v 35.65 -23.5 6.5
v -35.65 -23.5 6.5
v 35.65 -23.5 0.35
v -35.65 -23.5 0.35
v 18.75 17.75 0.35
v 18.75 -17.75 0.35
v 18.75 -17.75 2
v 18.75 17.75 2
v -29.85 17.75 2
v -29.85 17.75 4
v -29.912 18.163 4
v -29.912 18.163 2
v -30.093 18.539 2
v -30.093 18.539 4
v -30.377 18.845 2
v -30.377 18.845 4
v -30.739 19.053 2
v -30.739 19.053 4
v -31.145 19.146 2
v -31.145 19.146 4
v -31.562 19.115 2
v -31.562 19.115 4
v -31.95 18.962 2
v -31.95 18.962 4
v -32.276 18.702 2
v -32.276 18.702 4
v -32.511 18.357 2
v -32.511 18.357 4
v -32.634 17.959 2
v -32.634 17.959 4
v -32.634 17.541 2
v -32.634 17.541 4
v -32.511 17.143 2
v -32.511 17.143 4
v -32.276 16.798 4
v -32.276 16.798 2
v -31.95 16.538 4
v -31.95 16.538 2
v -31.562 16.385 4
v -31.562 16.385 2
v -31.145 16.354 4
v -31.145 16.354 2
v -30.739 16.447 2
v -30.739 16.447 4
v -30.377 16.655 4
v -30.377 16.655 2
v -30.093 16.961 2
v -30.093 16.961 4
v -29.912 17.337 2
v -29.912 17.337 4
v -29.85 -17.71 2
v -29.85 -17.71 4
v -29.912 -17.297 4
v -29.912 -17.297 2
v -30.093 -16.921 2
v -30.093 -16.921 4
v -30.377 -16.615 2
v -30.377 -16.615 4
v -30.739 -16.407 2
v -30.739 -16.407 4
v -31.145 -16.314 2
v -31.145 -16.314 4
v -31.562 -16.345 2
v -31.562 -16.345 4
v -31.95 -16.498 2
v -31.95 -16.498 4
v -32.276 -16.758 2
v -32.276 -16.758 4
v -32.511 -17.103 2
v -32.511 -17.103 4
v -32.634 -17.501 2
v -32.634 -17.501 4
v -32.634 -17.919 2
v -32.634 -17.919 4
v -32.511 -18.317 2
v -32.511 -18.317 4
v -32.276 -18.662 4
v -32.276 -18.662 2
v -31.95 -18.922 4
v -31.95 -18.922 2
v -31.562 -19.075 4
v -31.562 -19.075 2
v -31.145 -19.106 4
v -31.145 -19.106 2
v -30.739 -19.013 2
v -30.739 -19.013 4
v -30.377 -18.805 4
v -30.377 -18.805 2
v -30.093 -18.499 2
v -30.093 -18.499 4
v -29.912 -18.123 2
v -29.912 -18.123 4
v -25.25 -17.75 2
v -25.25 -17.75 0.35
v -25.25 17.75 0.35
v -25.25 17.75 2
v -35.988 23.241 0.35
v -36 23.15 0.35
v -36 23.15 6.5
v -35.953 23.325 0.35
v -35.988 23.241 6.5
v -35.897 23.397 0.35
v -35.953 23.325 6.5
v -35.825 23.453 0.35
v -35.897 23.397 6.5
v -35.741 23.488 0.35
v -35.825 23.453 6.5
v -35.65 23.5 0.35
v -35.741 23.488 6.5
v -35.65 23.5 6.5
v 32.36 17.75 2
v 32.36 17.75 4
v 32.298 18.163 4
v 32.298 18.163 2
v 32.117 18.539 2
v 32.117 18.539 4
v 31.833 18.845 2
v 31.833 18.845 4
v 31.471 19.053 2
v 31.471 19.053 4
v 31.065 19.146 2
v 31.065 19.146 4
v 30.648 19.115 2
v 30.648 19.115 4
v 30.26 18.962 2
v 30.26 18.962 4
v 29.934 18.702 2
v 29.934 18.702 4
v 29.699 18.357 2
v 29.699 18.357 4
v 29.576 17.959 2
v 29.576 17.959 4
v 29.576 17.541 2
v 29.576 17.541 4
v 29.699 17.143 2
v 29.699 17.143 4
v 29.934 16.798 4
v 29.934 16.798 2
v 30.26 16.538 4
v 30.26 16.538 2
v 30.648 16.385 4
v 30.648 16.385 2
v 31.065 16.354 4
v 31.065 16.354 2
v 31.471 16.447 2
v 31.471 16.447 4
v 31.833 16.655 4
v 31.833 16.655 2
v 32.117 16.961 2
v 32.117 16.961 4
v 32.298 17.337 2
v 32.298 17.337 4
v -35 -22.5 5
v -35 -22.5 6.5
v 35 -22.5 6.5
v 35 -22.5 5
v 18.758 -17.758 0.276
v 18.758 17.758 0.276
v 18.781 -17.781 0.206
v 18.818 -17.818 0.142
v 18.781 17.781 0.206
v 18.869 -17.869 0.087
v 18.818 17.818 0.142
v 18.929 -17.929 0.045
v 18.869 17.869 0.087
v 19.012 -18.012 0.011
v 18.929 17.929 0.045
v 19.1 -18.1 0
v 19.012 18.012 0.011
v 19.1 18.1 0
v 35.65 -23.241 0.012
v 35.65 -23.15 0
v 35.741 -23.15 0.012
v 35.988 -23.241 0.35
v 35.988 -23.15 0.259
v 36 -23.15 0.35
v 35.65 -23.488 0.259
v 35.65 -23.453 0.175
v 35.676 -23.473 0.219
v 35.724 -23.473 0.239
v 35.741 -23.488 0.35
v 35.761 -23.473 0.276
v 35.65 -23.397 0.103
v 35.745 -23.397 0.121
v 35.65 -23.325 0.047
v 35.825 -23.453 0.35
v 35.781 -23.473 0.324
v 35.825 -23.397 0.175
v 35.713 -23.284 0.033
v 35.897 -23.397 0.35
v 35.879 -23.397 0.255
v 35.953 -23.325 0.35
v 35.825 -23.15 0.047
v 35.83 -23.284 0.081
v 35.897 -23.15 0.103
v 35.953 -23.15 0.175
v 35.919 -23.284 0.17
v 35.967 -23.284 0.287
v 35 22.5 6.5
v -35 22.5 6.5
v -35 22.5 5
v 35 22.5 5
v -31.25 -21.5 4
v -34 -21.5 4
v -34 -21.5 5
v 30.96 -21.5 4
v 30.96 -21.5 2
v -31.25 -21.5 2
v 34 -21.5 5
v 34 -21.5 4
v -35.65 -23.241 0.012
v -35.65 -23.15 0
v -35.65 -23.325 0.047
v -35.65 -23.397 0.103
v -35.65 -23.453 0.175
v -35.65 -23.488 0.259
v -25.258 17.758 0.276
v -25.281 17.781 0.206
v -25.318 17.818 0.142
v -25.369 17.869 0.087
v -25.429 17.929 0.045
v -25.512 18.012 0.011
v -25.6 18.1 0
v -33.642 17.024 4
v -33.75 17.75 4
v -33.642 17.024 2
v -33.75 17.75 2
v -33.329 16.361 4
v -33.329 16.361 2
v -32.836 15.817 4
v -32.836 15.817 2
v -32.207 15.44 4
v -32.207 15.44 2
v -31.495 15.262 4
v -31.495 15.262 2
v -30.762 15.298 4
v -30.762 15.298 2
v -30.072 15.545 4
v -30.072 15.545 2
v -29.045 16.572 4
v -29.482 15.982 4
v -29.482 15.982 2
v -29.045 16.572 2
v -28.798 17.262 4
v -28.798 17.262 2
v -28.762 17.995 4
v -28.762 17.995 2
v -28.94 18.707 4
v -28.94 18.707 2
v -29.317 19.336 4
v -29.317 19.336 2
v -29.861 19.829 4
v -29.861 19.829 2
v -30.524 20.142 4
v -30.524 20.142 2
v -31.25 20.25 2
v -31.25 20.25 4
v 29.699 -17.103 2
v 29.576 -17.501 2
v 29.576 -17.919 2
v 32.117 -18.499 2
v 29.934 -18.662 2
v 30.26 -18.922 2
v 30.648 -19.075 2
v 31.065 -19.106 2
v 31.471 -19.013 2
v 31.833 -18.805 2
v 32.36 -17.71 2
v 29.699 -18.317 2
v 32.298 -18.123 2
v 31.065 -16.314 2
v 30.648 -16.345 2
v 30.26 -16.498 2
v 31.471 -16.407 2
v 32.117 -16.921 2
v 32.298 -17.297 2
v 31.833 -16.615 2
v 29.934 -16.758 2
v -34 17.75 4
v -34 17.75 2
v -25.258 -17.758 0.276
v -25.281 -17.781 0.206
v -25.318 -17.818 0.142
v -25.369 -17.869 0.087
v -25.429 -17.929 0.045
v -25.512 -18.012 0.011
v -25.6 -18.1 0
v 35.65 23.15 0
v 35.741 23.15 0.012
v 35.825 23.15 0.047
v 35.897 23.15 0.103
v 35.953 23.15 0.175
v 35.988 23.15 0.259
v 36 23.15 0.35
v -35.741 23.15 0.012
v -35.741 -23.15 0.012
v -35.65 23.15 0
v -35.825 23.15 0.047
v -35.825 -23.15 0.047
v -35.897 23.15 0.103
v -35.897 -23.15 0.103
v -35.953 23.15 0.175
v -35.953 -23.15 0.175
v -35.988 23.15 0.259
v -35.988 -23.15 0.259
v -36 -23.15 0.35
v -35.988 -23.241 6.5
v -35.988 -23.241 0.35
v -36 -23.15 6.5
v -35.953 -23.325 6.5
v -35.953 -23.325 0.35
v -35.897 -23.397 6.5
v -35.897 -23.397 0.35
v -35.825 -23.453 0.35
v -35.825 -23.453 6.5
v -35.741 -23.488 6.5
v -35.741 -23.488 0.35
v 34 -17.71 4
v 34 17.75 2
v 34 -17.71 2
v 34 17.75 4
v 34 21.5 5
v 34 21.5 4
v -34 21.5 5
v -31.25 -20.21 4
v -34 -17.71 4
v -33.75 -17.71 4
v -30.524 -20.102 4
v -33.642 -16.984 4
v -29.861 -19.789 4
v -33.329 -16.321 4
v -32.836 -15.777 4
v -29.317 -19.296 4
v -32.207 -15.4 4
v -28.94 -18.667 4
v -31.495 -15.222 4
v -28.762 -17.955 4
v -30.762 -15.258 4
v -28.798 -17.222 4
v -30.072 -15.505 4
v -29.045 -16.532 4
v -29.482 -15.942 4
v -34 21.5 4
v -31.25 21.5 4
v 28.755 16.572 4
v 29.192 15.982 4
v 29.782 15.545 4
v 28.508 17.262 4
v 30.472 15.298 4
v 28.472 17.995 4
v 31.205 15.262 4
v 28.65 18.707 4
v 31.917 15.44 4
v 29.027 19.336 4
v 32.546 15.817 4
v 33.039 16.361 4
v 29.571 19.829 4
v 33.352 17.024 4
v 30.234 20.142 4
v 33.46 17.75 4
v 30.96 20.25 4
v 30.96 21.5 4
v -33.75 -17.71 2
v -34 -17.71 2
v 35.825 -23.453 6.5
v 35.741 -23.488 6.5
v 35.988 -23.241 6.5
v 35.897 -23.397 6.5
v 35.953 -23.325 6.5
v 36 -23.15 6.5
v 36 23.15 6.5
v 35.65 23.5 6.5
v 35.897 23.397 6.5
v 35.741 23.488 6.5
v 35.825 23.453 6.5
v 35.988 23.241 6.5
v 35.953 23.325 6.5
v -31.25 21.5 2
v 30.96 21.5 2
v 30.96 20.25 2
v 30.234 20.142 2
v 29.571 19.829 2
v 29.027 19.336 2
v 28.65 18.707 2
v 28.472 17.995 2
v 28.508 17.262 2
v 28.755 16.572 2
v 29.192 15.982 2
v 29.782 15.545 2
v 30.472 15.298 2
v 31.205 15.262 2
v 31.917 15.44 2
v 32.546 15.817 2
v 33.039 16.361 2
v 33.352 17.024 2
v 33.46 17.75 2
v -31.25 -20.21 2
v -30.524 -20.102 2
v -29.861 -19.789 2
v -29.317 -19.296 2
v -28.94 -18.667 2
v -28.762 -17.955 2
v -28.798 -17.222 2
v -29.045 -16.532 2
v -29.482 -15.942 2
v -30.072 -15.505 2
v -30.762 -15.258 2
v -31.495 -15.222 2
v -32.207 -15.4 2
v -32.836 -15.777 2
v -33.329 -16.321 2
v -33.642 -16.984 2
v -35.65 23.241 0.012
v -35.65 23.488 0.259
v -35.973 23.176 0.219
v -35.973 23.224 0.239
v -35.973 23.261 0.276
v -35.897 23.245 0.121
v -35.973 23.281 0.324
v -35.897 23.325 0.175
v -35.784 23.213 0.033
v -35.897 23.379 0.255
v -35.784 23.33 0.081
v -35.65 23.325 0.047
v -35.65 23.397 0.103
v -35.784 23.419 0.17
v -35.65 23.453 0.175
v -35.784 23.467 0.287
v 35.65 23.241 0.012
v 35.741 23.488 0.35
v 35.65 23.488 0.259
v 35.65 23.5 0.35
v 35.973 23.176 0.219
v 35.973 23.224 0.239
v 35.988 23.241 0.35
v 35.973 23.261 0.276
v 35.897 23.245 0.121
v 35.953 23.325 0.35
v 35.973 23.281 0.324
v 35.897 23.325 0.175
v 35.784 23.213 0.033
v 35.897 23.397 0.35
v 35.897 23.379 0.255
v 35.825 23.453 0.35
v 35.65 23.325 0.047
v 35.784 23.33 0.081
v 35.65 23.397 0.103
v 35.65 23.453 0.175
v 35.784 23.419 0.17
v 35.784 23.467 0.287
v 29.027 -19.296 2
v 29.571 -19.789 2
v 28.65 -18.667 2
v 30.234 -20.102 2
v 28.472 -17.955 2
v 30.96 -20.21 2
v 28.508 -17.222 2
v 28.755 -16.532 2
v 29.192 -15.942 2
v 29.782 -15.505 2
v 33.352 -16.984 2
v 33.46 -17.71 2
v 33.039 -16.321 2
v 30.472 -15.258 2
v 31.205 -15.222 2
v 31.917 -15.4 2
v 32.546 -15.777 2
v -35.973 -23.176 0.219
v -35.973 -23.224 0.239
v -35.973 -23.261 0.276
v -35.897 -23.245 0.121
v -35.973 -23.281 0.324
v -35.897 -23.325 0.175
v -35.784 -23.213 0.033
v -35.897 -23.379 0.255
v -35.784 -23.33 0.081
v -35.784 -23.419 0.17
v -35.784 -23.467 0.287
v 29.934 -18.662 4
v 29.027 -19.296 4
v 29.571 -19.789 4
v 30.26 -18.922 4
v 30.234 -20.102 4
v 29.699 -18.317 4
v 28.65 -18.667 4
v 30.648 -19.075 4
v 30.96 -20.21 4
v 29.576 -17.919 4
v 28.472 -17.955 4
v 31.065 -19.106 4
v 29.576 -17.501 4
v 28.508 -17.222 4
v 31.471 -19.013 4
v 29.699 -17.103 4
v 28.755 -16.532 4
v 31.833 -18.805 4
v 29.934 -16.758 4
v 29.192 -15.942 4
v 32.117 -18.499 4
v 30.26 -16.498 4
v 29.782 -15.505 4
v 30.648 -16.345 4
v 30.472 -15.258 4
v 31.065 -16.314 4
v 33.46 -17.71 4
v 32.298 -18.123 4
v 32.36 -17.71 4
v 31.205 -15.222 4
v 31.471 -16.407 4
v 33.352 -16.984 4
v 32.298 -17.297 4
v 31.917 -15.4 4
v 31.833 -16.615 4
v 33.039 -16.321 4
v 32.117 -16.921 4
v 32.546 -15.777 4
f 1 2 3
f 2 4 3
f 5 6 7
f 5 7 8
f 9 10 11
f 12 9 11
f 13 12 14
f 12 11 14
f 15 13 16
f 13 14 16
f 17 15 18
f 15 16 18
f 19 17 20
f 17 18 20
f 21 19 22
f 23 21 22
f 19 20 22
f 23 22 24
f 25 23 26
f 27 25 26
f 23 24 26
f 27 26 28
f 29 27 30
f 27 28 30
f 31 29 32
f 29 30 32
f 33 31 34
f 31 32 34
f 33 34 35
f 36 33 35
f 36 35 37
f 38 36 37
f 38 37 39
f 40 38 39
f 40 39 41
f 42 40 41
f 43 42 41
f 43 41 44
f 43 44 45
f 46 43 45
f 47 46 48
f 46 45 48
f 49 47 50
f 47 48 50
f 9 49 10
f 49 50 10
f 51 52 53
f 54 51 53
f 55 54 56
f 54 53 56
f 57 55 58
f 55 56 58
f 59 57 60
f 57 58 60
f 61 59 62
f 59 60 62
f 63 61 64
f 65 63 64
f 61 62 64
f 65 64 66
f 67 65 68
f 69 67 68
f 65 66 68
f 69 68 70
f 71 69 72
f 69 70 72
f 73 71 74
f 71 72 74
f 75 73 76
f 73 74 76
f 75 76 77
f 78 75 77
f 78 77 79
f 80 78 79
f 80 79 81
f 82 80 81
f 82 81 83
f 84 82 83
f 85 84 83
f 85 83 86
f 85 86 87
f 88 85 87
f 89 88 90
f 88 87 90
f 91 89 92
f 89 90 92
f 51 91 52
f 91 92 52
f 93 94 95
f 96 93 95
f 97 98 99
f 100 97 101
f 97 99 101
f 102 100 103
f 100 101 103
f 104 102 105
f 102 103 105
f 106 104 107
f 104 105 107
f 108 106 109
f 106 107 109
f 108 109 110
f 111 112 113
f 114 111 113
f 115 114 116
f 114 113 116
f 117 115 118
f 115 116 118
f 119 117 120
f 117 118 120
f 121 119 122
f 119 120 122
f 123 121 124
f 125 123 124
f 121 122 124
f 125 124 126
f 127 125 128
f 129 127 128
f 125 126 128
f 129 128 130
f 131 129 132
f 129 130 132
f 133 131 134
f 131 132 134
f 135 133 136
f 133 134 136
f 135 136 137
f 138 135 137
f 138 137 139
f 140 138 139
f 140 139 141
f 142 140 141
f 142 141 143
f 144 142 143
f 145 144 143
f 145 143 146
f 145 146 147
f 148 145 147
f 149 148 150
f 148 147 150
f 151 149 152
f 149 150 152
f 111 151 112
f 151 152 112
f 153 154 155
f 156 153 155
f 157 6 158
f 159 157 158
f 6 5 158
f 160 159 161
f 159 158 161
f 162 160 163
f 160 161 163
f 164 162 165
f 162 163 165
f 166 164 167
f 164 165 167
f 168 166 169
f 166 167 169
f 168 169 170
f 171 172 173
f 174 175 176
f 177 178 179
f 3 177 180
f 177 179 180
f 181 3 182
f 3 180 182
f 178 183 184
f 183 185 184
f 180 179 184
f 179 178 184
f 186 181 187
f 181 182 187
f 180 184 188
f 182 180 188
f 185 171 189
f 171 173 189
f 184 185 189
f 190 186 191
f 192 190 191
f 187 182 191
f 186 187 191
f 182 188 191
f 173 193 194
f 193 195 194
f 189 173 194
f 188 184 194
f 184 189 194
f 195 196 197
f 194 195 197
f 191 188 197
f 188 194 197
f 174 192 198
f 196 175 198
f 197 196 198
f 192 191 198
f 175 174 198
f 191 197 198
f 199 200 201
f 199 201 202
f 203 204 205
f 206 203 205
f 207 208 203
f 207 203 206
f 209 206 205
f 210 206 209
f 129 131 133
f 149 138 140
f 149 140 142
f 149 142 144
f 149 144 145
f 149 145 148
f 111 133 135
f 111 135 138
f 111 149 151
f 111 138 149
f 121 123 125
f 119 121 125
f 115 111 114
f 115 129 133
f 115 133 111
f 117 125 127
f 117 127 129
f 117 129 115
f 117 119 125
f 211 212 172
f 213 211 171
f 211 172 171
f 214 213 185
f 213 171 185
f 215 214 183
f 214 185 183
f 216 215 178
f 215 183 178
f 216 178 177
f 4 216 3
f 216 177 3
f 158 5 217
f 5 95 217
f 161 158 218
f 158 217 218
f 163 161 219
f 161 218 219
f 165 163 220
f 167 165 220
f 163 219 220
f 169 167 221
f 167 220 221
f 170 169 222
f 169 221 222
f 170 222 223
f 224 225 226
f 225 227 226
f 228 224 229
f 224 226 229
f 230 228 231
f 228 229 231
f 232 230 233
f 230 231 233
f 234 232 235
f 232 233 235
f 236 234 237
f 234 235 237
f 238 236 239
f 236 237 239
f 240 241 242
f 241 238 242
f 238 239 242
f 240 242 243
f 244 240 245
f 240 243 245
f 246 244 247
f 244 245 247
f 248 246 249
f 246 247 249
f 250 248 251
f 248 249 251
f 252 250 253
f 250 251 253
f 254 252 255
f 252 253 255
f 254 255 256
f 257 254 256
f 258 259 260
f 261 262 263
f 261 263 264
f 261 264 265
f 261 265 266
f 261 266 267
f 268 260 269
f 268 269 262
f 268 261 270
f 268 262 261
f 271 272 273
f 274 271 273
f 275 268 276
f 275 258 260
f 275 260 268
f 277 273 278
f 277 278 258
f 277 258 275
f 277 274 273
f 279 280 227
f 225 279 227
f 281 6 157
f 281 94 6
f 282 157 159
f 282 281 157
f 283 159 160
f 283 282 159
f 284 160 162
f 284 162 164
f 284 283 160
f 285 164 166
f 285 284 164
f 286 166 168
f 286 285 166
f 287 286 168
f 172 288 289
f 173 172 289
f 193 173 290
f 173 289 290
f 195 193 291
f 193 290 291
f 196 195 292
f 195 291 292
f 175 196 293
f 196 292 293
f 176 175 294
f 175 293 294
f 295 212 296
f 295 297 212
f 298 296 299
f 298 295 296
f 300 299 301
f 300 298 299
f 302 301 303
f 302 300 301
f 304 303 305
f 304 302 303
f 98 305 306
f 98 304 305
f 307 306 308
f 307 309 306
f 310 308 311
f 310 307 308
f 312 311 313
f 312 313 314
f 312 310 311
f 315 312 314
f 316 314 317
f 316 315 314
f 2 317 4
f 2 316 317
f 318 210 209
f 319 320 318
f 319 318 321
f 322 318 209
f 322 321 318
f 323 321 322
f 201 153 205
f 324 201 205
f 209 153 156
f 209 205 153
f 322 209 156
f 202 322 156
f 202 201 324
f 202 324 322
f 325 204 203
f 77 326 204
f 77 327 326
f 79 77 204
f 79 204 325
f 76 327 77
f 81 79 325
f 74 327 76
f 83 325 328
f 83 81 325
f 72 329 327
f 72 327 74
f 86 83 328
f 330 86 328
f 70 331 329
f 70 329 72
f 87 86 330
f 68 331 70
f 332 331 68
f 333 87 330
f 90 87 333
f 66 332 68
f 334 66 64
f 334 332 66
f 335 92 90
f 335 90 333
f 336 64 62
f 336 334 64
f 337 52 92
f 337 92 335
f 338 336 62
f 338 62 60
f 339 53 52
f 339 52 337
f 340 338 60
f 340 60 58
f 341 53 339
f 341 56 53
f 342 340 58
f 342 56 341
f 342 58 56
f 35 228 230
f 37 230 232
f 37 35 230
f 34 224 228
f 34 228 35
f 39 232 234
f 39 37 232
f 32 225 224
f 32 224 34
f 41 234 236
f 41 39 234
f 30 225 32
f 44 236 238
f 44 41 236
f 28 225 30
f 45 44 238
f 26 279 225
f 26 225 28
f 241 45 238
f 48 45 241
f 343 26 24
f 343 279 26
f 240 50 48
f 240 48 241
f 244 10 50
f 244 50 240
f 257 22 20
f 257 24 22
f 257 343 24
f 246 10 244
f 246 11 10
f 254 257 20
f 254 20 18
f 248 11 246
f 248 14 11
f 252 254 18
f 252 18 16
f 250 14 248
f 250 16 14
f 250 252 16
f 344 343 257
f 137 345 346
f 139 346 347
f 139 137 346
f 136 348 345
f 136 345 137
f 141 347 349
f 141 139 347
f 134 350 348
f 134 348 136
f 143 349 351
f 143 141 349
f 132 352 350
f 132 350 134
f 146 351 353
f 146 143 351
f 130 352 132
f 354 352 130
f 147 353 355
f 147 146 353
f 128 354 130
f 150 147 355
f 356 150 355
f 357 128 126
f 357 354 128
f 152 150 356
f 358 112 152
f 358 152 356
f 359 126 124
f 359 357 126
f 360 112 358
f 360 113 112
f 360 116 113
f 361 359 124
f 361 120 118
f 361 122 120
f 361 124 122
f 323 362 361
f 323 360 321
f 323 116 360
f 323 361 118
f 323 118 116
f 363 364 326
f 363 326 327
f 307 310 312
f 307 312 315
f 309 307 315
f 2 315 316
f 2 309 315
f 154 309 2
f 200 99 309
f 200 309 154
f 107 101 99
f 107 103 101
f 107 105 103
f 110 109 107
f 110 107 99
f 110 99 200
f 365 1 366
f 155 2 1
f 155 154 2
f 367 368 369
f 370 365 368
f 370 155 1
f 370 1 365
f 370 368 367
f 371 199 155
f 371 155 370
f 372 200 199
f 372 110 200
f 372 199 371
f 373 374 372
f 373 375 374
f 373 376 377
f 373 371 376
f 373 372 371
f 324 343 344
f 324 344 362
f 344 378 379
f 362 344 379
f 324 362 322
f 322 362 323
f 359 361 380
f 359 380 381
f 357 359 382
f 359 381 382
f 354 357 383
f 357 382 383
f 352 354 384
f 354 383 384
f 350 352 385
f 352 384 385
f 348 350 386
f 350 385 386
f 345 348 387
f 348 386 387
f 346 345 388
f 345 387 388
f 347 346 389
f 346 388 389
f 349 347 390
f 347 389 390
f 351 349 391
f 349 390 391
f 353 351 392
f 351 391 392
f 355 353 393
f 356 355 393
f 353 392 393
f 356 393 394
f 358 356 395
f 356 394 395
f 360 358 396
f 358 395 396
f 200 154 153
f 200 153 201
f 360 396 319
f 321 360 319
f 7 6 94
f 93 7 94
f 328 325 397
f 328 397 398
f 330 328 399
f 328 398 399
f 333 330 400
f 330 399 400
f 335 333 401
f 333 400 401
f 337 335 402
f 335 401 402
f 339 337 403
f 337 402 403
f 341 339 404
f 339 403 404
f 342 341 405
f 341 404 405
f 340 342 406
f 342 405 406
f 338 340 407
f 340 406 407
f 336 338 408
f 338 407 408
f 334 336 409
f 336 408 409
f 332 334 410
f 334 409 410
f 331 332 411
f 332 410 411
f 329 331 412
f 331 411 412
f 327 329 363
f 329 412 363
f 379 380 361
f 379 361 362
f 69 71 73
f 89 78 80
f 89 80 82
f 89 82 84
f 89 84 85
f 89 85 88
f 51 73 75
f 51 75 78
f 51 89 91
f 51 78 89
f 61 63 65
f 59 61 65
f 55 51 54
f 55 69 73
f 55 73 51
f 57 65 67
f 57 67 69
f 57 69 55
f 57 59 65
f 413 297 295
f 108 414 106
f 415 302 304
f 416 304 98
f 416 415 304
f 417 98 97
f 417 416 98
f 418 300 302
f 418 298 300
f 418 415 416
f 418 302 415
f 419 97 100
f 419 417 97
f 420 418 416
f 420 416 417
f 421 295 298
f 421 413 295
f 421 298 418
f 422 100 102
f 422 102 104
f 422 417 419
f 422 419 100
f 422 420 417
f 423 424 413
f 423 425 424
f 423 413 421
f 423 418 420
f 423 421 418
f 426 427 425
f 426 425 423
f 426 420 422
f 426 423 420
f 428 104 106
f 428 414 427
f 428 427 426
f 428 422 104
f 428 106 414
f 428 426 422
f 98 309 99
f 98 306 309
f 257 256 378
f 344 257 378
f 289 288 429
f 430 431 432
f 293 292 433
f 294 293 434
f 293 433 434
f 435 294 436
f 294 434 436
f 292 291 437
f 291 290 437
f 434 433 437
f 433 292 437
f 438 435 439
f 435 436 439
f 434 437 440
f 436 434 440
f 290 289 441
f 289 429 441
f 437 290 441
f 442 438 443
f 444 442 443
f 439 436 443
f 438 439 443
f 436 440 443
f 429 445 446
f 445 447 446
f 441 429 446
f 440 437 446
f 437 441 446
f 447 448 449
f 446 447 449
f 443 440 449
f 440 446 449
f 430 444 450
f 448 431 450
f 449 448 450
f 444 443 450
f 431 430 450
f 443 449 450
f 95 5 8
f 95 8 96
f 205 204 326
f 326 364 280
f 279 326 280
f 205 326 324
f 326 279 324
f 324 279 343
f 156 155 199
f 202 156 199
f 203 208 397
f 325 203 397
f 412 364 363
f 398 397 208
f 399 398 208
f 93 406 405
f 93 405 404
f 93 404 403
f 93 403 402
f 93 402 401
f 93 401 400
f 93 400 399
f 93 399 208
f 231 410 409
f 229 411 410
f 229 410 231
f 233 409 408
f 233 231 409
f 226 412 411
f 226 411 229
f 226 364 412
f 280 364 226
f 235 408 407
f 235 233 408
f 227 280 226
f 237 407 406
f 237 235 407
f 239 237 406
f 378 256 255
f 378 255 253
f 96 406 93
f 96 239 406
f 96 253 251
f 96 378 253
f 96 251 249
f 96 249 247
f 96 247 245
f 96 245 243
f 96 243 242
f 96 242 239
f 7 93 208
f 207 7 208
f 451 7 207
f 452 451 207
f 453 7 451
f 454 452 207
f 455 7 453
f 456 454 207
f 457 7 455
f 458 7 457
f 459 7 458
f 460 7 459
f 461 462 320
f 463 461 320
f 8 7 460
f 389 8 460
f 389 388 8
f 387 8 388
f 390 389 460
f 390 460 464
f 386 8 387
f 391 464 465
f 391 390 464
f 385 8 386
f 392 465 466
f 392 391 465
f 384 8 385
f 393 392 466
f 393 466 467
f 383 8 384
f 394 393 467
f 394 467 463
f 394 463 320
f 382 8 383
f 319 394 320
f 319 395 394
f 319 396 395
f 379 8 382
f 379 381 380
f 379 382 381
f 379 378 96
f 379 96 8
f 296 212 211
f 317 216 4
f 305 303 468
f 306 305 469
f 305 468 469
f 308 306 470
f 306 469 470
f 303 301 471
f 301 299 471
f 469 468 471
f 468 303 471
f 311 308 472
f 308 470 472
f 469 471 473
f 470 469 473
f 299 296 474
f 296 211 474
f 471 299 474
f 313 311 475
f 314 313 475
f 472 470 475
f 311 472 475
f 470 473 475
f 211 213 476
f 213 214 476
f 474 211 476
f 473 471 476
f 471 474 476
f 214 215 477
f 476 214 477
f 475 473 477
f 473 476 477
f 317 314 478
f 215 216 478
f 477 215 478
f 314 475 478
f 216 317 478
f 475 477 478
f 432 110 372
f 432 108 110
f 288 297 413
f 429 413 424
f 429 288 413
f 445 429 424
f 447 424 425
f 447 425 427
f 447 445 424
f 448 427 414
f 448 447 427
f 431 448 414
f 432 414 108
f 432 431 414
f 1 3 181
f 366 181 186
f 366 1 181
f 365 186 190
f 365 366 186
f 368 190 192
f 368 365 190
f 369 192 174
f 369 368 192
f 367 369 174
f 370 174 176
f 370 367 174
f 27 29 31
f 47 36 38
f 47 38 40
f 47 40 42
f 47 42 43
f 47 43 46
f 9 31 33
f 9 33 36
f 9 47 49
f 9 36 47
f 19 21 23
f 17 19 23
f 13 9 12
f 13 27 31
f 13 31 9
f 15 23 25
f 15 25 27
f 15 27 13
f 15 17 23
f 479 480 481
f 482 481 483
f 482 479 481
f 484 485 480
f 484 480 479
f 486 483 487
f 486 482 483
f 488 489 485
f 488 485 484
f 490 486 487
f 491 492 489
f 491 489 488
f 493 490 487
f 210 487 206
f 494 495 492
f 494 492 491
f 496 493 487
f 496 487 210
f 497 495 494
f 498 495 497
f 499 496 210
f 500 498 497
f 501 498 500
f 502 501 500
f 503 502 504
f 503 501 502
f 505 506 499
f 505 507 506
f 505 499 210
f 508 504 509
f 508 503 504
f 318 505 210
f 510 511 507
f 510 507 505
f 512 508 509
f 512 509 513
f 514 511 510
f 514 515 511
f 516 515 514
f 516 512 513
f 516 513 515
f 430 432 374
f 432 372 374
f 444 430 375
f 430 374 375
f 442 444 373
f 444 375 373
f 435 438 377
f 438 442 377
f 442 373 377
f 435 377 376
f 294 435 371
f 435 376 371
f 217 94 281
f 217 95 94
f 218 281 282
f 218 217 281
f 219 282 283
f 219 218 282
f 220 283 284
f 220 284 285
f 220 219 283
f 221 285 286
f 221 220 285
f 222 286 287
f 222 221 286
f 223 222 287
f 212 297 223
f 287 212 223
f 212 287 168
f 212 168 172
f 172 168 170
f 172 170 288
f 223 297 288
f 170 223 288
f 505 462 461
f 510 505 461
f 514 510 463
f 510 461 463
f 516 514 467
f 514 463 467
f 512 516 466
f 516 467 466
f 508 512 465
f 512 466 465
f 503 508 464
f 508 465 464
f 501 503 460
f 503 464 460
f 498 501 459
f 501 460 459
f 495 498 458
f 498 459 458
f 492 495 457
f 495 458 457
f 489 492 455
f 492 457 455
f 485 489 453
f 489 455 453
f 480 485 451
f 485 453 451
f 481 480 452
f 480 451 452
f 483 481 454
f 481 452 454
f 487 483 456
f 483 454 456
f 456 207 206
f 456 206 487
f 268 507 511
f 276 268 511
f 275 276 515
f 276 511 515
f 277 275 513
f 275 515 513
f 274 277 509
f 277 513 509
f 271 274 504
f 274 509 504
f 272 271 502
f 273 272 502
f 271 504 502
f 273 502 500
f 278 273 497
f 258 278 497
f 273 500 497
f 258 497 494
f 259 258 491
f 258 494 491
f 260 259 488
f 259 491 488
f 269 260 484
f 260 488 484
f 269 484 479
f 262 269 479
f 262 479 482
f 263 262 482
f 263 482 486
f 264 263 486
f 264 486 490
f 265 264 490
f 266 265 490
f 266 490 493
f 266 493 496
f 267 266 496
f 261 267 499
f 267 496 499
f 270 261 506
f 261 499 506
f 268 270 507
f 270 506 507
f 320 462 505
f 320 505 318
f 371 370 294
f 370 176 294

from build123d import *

# Parameters (mm, degrees)
SKETCH1_W           = 72
SKETCH1_H           = 47
BOSS_EXTRUDE1_DEPTH = 6.5
SHELL1_T            = -2
SKETCH2_W           = 44
SKETCH2_H           = 35.5
CUT_EXTRUDE1_DEPTH  = 7.5
SKETCH3_R           = 2.5
BOSS_EXTRUDE2_DEPTH = 2
SKETCH5_W           = 2.75
SKETCH5_H           = 3.79
SKETCH5_H_2         = 3.75
SKETCH5_W_2         = 3.04
BOSS_EXTRUDE3_DEPTH = 2
SKETCH6_R           = 1.4
CUT_EXTRUDE2_DEPTH  = 2
SKETCH7_W           = 70
SKETCH7_H           = 45
CUT_EXTRUDE3_DEPTH  = 1.5
FILLET1_R           = 0.35


with BuildPart() as part:
    # Sketch1 → Boss-Extrude1 (new body)
    with BuildSketch(Plane.XY):
        Rectangle(SKETCH1_W, SKETCH1_H)
    extrude(amount=BOSS_EXTRUDE1_DEPTH)

    # Shell1
    shell1_openings = [part.faces().sort_by_distance(p)[0] for p in [
        (0, 0, 6.5),
    ]]
    offset(amount=SHELL1_T, openings=shell1_openings, kind=Kind.INTERSECTION)

    # Sketch2 → Cut-Extrude1 (cut, through all)
    with BuildSketch(Plane(origin=(0, 0, 0), x_dir=(-1, 0, 0), z_dir=(0, 0, -1))):
        with Locations((3.25, 0)):
            Rectangle(SKETCH2_W, SKETCH2_H)
    extrude(amount=-CUT_EXTRUDE1_DEPTH, mode=Mode.SUBTRACT)

    # Sketch3 → Boss-Extrude2 (add)
    with BuildSketch(Plane.XY.offset(2)):
        with Locations((-31.25, 17.75)):
            Circle(SKETCH3_R)
        with Locations((30.96, 17.75)):
            Circle(SKETCH3_R)
        with Locations((-31.25, -17.71)):
            Circle(SKETCH3_R)
        with Locations((30.96, -17.71)):
            Circle(SKETCH3_R)
    extrude(amount=BOSS_EXTRUDE2_DEPTH)

    # Sketch5 → Boss-Extrude3 (add)
    with BuildSketch(Plane.XY.offset(2)):
        with Locations((-32.625, -19.605)):
            Rectangle(SKETCH5_W, SKETCH5_H)
        with Locations((-32.625, 19.625)):
            Rectangle(SKETCH5_W, SKETCH5_H_2)
        with Locations((32.48, 19.625)):
            Rectangle(SKETCH5_W_2, SKETCH5_H_2)
        with Locations((32.48, -19.605)):
            Rectangle(SKETCH5_W_2, SKETCH5_H)
    extrude(amount=BOSS_EXTRUDE3_DEPTH)

    # Sketch6 → Cut-Extrude2 (cut)
    with BuildSketch(Plane.XY.offset(4)):
        with Locations((-31.25, -17.71)):
            Circle(SKETCH6_R)
        with Locations((-31.25, 17.75)):
            Circle(SKETCH6_R)
        with Locations((30.96, 17.75)):
            Circle(SKETCH6_R)
        with Locations((30.96, -17.71)):
            Circle(SKETCH6_R)
    extrude(amount=-CUT_EXTRUDE2_DEPTH, mode=Mode.SUBTRACT)

    # Sketch7 → Cut-Extrude3 (cut)
    with BuildSketch(Plane.XY.offset(6.5)):
        Rectangle(SKETCH7_W, SKETCH7_H)
    extrude(amount=-CUT_EXTRUDE3_DEPTH, mode=Mode.SUBTRACT)

    # Fillet1
    fillet1_edges = [part.edges().sort_by_distance(p)[0] for p in [
        (18.75, 0, 0),
        (-3.25, -17.75, 0),
        (-25.25, 0, 0),
        (-3.25, 17.75, 0),
        (0, 23.5, 0),
        (36, 0, 0),
        (0, -23.5, 0),
        (-36, 0, 0),
        (-36, 23.5, 3.25),
        (36, 23.5, 3.25),
        (36, -23.5, 3.25),
        (-36, -23.5, 3.25),
    ]]
    fillet(fillet1_edges, radius=FILLET1_R)


solid = part.part
